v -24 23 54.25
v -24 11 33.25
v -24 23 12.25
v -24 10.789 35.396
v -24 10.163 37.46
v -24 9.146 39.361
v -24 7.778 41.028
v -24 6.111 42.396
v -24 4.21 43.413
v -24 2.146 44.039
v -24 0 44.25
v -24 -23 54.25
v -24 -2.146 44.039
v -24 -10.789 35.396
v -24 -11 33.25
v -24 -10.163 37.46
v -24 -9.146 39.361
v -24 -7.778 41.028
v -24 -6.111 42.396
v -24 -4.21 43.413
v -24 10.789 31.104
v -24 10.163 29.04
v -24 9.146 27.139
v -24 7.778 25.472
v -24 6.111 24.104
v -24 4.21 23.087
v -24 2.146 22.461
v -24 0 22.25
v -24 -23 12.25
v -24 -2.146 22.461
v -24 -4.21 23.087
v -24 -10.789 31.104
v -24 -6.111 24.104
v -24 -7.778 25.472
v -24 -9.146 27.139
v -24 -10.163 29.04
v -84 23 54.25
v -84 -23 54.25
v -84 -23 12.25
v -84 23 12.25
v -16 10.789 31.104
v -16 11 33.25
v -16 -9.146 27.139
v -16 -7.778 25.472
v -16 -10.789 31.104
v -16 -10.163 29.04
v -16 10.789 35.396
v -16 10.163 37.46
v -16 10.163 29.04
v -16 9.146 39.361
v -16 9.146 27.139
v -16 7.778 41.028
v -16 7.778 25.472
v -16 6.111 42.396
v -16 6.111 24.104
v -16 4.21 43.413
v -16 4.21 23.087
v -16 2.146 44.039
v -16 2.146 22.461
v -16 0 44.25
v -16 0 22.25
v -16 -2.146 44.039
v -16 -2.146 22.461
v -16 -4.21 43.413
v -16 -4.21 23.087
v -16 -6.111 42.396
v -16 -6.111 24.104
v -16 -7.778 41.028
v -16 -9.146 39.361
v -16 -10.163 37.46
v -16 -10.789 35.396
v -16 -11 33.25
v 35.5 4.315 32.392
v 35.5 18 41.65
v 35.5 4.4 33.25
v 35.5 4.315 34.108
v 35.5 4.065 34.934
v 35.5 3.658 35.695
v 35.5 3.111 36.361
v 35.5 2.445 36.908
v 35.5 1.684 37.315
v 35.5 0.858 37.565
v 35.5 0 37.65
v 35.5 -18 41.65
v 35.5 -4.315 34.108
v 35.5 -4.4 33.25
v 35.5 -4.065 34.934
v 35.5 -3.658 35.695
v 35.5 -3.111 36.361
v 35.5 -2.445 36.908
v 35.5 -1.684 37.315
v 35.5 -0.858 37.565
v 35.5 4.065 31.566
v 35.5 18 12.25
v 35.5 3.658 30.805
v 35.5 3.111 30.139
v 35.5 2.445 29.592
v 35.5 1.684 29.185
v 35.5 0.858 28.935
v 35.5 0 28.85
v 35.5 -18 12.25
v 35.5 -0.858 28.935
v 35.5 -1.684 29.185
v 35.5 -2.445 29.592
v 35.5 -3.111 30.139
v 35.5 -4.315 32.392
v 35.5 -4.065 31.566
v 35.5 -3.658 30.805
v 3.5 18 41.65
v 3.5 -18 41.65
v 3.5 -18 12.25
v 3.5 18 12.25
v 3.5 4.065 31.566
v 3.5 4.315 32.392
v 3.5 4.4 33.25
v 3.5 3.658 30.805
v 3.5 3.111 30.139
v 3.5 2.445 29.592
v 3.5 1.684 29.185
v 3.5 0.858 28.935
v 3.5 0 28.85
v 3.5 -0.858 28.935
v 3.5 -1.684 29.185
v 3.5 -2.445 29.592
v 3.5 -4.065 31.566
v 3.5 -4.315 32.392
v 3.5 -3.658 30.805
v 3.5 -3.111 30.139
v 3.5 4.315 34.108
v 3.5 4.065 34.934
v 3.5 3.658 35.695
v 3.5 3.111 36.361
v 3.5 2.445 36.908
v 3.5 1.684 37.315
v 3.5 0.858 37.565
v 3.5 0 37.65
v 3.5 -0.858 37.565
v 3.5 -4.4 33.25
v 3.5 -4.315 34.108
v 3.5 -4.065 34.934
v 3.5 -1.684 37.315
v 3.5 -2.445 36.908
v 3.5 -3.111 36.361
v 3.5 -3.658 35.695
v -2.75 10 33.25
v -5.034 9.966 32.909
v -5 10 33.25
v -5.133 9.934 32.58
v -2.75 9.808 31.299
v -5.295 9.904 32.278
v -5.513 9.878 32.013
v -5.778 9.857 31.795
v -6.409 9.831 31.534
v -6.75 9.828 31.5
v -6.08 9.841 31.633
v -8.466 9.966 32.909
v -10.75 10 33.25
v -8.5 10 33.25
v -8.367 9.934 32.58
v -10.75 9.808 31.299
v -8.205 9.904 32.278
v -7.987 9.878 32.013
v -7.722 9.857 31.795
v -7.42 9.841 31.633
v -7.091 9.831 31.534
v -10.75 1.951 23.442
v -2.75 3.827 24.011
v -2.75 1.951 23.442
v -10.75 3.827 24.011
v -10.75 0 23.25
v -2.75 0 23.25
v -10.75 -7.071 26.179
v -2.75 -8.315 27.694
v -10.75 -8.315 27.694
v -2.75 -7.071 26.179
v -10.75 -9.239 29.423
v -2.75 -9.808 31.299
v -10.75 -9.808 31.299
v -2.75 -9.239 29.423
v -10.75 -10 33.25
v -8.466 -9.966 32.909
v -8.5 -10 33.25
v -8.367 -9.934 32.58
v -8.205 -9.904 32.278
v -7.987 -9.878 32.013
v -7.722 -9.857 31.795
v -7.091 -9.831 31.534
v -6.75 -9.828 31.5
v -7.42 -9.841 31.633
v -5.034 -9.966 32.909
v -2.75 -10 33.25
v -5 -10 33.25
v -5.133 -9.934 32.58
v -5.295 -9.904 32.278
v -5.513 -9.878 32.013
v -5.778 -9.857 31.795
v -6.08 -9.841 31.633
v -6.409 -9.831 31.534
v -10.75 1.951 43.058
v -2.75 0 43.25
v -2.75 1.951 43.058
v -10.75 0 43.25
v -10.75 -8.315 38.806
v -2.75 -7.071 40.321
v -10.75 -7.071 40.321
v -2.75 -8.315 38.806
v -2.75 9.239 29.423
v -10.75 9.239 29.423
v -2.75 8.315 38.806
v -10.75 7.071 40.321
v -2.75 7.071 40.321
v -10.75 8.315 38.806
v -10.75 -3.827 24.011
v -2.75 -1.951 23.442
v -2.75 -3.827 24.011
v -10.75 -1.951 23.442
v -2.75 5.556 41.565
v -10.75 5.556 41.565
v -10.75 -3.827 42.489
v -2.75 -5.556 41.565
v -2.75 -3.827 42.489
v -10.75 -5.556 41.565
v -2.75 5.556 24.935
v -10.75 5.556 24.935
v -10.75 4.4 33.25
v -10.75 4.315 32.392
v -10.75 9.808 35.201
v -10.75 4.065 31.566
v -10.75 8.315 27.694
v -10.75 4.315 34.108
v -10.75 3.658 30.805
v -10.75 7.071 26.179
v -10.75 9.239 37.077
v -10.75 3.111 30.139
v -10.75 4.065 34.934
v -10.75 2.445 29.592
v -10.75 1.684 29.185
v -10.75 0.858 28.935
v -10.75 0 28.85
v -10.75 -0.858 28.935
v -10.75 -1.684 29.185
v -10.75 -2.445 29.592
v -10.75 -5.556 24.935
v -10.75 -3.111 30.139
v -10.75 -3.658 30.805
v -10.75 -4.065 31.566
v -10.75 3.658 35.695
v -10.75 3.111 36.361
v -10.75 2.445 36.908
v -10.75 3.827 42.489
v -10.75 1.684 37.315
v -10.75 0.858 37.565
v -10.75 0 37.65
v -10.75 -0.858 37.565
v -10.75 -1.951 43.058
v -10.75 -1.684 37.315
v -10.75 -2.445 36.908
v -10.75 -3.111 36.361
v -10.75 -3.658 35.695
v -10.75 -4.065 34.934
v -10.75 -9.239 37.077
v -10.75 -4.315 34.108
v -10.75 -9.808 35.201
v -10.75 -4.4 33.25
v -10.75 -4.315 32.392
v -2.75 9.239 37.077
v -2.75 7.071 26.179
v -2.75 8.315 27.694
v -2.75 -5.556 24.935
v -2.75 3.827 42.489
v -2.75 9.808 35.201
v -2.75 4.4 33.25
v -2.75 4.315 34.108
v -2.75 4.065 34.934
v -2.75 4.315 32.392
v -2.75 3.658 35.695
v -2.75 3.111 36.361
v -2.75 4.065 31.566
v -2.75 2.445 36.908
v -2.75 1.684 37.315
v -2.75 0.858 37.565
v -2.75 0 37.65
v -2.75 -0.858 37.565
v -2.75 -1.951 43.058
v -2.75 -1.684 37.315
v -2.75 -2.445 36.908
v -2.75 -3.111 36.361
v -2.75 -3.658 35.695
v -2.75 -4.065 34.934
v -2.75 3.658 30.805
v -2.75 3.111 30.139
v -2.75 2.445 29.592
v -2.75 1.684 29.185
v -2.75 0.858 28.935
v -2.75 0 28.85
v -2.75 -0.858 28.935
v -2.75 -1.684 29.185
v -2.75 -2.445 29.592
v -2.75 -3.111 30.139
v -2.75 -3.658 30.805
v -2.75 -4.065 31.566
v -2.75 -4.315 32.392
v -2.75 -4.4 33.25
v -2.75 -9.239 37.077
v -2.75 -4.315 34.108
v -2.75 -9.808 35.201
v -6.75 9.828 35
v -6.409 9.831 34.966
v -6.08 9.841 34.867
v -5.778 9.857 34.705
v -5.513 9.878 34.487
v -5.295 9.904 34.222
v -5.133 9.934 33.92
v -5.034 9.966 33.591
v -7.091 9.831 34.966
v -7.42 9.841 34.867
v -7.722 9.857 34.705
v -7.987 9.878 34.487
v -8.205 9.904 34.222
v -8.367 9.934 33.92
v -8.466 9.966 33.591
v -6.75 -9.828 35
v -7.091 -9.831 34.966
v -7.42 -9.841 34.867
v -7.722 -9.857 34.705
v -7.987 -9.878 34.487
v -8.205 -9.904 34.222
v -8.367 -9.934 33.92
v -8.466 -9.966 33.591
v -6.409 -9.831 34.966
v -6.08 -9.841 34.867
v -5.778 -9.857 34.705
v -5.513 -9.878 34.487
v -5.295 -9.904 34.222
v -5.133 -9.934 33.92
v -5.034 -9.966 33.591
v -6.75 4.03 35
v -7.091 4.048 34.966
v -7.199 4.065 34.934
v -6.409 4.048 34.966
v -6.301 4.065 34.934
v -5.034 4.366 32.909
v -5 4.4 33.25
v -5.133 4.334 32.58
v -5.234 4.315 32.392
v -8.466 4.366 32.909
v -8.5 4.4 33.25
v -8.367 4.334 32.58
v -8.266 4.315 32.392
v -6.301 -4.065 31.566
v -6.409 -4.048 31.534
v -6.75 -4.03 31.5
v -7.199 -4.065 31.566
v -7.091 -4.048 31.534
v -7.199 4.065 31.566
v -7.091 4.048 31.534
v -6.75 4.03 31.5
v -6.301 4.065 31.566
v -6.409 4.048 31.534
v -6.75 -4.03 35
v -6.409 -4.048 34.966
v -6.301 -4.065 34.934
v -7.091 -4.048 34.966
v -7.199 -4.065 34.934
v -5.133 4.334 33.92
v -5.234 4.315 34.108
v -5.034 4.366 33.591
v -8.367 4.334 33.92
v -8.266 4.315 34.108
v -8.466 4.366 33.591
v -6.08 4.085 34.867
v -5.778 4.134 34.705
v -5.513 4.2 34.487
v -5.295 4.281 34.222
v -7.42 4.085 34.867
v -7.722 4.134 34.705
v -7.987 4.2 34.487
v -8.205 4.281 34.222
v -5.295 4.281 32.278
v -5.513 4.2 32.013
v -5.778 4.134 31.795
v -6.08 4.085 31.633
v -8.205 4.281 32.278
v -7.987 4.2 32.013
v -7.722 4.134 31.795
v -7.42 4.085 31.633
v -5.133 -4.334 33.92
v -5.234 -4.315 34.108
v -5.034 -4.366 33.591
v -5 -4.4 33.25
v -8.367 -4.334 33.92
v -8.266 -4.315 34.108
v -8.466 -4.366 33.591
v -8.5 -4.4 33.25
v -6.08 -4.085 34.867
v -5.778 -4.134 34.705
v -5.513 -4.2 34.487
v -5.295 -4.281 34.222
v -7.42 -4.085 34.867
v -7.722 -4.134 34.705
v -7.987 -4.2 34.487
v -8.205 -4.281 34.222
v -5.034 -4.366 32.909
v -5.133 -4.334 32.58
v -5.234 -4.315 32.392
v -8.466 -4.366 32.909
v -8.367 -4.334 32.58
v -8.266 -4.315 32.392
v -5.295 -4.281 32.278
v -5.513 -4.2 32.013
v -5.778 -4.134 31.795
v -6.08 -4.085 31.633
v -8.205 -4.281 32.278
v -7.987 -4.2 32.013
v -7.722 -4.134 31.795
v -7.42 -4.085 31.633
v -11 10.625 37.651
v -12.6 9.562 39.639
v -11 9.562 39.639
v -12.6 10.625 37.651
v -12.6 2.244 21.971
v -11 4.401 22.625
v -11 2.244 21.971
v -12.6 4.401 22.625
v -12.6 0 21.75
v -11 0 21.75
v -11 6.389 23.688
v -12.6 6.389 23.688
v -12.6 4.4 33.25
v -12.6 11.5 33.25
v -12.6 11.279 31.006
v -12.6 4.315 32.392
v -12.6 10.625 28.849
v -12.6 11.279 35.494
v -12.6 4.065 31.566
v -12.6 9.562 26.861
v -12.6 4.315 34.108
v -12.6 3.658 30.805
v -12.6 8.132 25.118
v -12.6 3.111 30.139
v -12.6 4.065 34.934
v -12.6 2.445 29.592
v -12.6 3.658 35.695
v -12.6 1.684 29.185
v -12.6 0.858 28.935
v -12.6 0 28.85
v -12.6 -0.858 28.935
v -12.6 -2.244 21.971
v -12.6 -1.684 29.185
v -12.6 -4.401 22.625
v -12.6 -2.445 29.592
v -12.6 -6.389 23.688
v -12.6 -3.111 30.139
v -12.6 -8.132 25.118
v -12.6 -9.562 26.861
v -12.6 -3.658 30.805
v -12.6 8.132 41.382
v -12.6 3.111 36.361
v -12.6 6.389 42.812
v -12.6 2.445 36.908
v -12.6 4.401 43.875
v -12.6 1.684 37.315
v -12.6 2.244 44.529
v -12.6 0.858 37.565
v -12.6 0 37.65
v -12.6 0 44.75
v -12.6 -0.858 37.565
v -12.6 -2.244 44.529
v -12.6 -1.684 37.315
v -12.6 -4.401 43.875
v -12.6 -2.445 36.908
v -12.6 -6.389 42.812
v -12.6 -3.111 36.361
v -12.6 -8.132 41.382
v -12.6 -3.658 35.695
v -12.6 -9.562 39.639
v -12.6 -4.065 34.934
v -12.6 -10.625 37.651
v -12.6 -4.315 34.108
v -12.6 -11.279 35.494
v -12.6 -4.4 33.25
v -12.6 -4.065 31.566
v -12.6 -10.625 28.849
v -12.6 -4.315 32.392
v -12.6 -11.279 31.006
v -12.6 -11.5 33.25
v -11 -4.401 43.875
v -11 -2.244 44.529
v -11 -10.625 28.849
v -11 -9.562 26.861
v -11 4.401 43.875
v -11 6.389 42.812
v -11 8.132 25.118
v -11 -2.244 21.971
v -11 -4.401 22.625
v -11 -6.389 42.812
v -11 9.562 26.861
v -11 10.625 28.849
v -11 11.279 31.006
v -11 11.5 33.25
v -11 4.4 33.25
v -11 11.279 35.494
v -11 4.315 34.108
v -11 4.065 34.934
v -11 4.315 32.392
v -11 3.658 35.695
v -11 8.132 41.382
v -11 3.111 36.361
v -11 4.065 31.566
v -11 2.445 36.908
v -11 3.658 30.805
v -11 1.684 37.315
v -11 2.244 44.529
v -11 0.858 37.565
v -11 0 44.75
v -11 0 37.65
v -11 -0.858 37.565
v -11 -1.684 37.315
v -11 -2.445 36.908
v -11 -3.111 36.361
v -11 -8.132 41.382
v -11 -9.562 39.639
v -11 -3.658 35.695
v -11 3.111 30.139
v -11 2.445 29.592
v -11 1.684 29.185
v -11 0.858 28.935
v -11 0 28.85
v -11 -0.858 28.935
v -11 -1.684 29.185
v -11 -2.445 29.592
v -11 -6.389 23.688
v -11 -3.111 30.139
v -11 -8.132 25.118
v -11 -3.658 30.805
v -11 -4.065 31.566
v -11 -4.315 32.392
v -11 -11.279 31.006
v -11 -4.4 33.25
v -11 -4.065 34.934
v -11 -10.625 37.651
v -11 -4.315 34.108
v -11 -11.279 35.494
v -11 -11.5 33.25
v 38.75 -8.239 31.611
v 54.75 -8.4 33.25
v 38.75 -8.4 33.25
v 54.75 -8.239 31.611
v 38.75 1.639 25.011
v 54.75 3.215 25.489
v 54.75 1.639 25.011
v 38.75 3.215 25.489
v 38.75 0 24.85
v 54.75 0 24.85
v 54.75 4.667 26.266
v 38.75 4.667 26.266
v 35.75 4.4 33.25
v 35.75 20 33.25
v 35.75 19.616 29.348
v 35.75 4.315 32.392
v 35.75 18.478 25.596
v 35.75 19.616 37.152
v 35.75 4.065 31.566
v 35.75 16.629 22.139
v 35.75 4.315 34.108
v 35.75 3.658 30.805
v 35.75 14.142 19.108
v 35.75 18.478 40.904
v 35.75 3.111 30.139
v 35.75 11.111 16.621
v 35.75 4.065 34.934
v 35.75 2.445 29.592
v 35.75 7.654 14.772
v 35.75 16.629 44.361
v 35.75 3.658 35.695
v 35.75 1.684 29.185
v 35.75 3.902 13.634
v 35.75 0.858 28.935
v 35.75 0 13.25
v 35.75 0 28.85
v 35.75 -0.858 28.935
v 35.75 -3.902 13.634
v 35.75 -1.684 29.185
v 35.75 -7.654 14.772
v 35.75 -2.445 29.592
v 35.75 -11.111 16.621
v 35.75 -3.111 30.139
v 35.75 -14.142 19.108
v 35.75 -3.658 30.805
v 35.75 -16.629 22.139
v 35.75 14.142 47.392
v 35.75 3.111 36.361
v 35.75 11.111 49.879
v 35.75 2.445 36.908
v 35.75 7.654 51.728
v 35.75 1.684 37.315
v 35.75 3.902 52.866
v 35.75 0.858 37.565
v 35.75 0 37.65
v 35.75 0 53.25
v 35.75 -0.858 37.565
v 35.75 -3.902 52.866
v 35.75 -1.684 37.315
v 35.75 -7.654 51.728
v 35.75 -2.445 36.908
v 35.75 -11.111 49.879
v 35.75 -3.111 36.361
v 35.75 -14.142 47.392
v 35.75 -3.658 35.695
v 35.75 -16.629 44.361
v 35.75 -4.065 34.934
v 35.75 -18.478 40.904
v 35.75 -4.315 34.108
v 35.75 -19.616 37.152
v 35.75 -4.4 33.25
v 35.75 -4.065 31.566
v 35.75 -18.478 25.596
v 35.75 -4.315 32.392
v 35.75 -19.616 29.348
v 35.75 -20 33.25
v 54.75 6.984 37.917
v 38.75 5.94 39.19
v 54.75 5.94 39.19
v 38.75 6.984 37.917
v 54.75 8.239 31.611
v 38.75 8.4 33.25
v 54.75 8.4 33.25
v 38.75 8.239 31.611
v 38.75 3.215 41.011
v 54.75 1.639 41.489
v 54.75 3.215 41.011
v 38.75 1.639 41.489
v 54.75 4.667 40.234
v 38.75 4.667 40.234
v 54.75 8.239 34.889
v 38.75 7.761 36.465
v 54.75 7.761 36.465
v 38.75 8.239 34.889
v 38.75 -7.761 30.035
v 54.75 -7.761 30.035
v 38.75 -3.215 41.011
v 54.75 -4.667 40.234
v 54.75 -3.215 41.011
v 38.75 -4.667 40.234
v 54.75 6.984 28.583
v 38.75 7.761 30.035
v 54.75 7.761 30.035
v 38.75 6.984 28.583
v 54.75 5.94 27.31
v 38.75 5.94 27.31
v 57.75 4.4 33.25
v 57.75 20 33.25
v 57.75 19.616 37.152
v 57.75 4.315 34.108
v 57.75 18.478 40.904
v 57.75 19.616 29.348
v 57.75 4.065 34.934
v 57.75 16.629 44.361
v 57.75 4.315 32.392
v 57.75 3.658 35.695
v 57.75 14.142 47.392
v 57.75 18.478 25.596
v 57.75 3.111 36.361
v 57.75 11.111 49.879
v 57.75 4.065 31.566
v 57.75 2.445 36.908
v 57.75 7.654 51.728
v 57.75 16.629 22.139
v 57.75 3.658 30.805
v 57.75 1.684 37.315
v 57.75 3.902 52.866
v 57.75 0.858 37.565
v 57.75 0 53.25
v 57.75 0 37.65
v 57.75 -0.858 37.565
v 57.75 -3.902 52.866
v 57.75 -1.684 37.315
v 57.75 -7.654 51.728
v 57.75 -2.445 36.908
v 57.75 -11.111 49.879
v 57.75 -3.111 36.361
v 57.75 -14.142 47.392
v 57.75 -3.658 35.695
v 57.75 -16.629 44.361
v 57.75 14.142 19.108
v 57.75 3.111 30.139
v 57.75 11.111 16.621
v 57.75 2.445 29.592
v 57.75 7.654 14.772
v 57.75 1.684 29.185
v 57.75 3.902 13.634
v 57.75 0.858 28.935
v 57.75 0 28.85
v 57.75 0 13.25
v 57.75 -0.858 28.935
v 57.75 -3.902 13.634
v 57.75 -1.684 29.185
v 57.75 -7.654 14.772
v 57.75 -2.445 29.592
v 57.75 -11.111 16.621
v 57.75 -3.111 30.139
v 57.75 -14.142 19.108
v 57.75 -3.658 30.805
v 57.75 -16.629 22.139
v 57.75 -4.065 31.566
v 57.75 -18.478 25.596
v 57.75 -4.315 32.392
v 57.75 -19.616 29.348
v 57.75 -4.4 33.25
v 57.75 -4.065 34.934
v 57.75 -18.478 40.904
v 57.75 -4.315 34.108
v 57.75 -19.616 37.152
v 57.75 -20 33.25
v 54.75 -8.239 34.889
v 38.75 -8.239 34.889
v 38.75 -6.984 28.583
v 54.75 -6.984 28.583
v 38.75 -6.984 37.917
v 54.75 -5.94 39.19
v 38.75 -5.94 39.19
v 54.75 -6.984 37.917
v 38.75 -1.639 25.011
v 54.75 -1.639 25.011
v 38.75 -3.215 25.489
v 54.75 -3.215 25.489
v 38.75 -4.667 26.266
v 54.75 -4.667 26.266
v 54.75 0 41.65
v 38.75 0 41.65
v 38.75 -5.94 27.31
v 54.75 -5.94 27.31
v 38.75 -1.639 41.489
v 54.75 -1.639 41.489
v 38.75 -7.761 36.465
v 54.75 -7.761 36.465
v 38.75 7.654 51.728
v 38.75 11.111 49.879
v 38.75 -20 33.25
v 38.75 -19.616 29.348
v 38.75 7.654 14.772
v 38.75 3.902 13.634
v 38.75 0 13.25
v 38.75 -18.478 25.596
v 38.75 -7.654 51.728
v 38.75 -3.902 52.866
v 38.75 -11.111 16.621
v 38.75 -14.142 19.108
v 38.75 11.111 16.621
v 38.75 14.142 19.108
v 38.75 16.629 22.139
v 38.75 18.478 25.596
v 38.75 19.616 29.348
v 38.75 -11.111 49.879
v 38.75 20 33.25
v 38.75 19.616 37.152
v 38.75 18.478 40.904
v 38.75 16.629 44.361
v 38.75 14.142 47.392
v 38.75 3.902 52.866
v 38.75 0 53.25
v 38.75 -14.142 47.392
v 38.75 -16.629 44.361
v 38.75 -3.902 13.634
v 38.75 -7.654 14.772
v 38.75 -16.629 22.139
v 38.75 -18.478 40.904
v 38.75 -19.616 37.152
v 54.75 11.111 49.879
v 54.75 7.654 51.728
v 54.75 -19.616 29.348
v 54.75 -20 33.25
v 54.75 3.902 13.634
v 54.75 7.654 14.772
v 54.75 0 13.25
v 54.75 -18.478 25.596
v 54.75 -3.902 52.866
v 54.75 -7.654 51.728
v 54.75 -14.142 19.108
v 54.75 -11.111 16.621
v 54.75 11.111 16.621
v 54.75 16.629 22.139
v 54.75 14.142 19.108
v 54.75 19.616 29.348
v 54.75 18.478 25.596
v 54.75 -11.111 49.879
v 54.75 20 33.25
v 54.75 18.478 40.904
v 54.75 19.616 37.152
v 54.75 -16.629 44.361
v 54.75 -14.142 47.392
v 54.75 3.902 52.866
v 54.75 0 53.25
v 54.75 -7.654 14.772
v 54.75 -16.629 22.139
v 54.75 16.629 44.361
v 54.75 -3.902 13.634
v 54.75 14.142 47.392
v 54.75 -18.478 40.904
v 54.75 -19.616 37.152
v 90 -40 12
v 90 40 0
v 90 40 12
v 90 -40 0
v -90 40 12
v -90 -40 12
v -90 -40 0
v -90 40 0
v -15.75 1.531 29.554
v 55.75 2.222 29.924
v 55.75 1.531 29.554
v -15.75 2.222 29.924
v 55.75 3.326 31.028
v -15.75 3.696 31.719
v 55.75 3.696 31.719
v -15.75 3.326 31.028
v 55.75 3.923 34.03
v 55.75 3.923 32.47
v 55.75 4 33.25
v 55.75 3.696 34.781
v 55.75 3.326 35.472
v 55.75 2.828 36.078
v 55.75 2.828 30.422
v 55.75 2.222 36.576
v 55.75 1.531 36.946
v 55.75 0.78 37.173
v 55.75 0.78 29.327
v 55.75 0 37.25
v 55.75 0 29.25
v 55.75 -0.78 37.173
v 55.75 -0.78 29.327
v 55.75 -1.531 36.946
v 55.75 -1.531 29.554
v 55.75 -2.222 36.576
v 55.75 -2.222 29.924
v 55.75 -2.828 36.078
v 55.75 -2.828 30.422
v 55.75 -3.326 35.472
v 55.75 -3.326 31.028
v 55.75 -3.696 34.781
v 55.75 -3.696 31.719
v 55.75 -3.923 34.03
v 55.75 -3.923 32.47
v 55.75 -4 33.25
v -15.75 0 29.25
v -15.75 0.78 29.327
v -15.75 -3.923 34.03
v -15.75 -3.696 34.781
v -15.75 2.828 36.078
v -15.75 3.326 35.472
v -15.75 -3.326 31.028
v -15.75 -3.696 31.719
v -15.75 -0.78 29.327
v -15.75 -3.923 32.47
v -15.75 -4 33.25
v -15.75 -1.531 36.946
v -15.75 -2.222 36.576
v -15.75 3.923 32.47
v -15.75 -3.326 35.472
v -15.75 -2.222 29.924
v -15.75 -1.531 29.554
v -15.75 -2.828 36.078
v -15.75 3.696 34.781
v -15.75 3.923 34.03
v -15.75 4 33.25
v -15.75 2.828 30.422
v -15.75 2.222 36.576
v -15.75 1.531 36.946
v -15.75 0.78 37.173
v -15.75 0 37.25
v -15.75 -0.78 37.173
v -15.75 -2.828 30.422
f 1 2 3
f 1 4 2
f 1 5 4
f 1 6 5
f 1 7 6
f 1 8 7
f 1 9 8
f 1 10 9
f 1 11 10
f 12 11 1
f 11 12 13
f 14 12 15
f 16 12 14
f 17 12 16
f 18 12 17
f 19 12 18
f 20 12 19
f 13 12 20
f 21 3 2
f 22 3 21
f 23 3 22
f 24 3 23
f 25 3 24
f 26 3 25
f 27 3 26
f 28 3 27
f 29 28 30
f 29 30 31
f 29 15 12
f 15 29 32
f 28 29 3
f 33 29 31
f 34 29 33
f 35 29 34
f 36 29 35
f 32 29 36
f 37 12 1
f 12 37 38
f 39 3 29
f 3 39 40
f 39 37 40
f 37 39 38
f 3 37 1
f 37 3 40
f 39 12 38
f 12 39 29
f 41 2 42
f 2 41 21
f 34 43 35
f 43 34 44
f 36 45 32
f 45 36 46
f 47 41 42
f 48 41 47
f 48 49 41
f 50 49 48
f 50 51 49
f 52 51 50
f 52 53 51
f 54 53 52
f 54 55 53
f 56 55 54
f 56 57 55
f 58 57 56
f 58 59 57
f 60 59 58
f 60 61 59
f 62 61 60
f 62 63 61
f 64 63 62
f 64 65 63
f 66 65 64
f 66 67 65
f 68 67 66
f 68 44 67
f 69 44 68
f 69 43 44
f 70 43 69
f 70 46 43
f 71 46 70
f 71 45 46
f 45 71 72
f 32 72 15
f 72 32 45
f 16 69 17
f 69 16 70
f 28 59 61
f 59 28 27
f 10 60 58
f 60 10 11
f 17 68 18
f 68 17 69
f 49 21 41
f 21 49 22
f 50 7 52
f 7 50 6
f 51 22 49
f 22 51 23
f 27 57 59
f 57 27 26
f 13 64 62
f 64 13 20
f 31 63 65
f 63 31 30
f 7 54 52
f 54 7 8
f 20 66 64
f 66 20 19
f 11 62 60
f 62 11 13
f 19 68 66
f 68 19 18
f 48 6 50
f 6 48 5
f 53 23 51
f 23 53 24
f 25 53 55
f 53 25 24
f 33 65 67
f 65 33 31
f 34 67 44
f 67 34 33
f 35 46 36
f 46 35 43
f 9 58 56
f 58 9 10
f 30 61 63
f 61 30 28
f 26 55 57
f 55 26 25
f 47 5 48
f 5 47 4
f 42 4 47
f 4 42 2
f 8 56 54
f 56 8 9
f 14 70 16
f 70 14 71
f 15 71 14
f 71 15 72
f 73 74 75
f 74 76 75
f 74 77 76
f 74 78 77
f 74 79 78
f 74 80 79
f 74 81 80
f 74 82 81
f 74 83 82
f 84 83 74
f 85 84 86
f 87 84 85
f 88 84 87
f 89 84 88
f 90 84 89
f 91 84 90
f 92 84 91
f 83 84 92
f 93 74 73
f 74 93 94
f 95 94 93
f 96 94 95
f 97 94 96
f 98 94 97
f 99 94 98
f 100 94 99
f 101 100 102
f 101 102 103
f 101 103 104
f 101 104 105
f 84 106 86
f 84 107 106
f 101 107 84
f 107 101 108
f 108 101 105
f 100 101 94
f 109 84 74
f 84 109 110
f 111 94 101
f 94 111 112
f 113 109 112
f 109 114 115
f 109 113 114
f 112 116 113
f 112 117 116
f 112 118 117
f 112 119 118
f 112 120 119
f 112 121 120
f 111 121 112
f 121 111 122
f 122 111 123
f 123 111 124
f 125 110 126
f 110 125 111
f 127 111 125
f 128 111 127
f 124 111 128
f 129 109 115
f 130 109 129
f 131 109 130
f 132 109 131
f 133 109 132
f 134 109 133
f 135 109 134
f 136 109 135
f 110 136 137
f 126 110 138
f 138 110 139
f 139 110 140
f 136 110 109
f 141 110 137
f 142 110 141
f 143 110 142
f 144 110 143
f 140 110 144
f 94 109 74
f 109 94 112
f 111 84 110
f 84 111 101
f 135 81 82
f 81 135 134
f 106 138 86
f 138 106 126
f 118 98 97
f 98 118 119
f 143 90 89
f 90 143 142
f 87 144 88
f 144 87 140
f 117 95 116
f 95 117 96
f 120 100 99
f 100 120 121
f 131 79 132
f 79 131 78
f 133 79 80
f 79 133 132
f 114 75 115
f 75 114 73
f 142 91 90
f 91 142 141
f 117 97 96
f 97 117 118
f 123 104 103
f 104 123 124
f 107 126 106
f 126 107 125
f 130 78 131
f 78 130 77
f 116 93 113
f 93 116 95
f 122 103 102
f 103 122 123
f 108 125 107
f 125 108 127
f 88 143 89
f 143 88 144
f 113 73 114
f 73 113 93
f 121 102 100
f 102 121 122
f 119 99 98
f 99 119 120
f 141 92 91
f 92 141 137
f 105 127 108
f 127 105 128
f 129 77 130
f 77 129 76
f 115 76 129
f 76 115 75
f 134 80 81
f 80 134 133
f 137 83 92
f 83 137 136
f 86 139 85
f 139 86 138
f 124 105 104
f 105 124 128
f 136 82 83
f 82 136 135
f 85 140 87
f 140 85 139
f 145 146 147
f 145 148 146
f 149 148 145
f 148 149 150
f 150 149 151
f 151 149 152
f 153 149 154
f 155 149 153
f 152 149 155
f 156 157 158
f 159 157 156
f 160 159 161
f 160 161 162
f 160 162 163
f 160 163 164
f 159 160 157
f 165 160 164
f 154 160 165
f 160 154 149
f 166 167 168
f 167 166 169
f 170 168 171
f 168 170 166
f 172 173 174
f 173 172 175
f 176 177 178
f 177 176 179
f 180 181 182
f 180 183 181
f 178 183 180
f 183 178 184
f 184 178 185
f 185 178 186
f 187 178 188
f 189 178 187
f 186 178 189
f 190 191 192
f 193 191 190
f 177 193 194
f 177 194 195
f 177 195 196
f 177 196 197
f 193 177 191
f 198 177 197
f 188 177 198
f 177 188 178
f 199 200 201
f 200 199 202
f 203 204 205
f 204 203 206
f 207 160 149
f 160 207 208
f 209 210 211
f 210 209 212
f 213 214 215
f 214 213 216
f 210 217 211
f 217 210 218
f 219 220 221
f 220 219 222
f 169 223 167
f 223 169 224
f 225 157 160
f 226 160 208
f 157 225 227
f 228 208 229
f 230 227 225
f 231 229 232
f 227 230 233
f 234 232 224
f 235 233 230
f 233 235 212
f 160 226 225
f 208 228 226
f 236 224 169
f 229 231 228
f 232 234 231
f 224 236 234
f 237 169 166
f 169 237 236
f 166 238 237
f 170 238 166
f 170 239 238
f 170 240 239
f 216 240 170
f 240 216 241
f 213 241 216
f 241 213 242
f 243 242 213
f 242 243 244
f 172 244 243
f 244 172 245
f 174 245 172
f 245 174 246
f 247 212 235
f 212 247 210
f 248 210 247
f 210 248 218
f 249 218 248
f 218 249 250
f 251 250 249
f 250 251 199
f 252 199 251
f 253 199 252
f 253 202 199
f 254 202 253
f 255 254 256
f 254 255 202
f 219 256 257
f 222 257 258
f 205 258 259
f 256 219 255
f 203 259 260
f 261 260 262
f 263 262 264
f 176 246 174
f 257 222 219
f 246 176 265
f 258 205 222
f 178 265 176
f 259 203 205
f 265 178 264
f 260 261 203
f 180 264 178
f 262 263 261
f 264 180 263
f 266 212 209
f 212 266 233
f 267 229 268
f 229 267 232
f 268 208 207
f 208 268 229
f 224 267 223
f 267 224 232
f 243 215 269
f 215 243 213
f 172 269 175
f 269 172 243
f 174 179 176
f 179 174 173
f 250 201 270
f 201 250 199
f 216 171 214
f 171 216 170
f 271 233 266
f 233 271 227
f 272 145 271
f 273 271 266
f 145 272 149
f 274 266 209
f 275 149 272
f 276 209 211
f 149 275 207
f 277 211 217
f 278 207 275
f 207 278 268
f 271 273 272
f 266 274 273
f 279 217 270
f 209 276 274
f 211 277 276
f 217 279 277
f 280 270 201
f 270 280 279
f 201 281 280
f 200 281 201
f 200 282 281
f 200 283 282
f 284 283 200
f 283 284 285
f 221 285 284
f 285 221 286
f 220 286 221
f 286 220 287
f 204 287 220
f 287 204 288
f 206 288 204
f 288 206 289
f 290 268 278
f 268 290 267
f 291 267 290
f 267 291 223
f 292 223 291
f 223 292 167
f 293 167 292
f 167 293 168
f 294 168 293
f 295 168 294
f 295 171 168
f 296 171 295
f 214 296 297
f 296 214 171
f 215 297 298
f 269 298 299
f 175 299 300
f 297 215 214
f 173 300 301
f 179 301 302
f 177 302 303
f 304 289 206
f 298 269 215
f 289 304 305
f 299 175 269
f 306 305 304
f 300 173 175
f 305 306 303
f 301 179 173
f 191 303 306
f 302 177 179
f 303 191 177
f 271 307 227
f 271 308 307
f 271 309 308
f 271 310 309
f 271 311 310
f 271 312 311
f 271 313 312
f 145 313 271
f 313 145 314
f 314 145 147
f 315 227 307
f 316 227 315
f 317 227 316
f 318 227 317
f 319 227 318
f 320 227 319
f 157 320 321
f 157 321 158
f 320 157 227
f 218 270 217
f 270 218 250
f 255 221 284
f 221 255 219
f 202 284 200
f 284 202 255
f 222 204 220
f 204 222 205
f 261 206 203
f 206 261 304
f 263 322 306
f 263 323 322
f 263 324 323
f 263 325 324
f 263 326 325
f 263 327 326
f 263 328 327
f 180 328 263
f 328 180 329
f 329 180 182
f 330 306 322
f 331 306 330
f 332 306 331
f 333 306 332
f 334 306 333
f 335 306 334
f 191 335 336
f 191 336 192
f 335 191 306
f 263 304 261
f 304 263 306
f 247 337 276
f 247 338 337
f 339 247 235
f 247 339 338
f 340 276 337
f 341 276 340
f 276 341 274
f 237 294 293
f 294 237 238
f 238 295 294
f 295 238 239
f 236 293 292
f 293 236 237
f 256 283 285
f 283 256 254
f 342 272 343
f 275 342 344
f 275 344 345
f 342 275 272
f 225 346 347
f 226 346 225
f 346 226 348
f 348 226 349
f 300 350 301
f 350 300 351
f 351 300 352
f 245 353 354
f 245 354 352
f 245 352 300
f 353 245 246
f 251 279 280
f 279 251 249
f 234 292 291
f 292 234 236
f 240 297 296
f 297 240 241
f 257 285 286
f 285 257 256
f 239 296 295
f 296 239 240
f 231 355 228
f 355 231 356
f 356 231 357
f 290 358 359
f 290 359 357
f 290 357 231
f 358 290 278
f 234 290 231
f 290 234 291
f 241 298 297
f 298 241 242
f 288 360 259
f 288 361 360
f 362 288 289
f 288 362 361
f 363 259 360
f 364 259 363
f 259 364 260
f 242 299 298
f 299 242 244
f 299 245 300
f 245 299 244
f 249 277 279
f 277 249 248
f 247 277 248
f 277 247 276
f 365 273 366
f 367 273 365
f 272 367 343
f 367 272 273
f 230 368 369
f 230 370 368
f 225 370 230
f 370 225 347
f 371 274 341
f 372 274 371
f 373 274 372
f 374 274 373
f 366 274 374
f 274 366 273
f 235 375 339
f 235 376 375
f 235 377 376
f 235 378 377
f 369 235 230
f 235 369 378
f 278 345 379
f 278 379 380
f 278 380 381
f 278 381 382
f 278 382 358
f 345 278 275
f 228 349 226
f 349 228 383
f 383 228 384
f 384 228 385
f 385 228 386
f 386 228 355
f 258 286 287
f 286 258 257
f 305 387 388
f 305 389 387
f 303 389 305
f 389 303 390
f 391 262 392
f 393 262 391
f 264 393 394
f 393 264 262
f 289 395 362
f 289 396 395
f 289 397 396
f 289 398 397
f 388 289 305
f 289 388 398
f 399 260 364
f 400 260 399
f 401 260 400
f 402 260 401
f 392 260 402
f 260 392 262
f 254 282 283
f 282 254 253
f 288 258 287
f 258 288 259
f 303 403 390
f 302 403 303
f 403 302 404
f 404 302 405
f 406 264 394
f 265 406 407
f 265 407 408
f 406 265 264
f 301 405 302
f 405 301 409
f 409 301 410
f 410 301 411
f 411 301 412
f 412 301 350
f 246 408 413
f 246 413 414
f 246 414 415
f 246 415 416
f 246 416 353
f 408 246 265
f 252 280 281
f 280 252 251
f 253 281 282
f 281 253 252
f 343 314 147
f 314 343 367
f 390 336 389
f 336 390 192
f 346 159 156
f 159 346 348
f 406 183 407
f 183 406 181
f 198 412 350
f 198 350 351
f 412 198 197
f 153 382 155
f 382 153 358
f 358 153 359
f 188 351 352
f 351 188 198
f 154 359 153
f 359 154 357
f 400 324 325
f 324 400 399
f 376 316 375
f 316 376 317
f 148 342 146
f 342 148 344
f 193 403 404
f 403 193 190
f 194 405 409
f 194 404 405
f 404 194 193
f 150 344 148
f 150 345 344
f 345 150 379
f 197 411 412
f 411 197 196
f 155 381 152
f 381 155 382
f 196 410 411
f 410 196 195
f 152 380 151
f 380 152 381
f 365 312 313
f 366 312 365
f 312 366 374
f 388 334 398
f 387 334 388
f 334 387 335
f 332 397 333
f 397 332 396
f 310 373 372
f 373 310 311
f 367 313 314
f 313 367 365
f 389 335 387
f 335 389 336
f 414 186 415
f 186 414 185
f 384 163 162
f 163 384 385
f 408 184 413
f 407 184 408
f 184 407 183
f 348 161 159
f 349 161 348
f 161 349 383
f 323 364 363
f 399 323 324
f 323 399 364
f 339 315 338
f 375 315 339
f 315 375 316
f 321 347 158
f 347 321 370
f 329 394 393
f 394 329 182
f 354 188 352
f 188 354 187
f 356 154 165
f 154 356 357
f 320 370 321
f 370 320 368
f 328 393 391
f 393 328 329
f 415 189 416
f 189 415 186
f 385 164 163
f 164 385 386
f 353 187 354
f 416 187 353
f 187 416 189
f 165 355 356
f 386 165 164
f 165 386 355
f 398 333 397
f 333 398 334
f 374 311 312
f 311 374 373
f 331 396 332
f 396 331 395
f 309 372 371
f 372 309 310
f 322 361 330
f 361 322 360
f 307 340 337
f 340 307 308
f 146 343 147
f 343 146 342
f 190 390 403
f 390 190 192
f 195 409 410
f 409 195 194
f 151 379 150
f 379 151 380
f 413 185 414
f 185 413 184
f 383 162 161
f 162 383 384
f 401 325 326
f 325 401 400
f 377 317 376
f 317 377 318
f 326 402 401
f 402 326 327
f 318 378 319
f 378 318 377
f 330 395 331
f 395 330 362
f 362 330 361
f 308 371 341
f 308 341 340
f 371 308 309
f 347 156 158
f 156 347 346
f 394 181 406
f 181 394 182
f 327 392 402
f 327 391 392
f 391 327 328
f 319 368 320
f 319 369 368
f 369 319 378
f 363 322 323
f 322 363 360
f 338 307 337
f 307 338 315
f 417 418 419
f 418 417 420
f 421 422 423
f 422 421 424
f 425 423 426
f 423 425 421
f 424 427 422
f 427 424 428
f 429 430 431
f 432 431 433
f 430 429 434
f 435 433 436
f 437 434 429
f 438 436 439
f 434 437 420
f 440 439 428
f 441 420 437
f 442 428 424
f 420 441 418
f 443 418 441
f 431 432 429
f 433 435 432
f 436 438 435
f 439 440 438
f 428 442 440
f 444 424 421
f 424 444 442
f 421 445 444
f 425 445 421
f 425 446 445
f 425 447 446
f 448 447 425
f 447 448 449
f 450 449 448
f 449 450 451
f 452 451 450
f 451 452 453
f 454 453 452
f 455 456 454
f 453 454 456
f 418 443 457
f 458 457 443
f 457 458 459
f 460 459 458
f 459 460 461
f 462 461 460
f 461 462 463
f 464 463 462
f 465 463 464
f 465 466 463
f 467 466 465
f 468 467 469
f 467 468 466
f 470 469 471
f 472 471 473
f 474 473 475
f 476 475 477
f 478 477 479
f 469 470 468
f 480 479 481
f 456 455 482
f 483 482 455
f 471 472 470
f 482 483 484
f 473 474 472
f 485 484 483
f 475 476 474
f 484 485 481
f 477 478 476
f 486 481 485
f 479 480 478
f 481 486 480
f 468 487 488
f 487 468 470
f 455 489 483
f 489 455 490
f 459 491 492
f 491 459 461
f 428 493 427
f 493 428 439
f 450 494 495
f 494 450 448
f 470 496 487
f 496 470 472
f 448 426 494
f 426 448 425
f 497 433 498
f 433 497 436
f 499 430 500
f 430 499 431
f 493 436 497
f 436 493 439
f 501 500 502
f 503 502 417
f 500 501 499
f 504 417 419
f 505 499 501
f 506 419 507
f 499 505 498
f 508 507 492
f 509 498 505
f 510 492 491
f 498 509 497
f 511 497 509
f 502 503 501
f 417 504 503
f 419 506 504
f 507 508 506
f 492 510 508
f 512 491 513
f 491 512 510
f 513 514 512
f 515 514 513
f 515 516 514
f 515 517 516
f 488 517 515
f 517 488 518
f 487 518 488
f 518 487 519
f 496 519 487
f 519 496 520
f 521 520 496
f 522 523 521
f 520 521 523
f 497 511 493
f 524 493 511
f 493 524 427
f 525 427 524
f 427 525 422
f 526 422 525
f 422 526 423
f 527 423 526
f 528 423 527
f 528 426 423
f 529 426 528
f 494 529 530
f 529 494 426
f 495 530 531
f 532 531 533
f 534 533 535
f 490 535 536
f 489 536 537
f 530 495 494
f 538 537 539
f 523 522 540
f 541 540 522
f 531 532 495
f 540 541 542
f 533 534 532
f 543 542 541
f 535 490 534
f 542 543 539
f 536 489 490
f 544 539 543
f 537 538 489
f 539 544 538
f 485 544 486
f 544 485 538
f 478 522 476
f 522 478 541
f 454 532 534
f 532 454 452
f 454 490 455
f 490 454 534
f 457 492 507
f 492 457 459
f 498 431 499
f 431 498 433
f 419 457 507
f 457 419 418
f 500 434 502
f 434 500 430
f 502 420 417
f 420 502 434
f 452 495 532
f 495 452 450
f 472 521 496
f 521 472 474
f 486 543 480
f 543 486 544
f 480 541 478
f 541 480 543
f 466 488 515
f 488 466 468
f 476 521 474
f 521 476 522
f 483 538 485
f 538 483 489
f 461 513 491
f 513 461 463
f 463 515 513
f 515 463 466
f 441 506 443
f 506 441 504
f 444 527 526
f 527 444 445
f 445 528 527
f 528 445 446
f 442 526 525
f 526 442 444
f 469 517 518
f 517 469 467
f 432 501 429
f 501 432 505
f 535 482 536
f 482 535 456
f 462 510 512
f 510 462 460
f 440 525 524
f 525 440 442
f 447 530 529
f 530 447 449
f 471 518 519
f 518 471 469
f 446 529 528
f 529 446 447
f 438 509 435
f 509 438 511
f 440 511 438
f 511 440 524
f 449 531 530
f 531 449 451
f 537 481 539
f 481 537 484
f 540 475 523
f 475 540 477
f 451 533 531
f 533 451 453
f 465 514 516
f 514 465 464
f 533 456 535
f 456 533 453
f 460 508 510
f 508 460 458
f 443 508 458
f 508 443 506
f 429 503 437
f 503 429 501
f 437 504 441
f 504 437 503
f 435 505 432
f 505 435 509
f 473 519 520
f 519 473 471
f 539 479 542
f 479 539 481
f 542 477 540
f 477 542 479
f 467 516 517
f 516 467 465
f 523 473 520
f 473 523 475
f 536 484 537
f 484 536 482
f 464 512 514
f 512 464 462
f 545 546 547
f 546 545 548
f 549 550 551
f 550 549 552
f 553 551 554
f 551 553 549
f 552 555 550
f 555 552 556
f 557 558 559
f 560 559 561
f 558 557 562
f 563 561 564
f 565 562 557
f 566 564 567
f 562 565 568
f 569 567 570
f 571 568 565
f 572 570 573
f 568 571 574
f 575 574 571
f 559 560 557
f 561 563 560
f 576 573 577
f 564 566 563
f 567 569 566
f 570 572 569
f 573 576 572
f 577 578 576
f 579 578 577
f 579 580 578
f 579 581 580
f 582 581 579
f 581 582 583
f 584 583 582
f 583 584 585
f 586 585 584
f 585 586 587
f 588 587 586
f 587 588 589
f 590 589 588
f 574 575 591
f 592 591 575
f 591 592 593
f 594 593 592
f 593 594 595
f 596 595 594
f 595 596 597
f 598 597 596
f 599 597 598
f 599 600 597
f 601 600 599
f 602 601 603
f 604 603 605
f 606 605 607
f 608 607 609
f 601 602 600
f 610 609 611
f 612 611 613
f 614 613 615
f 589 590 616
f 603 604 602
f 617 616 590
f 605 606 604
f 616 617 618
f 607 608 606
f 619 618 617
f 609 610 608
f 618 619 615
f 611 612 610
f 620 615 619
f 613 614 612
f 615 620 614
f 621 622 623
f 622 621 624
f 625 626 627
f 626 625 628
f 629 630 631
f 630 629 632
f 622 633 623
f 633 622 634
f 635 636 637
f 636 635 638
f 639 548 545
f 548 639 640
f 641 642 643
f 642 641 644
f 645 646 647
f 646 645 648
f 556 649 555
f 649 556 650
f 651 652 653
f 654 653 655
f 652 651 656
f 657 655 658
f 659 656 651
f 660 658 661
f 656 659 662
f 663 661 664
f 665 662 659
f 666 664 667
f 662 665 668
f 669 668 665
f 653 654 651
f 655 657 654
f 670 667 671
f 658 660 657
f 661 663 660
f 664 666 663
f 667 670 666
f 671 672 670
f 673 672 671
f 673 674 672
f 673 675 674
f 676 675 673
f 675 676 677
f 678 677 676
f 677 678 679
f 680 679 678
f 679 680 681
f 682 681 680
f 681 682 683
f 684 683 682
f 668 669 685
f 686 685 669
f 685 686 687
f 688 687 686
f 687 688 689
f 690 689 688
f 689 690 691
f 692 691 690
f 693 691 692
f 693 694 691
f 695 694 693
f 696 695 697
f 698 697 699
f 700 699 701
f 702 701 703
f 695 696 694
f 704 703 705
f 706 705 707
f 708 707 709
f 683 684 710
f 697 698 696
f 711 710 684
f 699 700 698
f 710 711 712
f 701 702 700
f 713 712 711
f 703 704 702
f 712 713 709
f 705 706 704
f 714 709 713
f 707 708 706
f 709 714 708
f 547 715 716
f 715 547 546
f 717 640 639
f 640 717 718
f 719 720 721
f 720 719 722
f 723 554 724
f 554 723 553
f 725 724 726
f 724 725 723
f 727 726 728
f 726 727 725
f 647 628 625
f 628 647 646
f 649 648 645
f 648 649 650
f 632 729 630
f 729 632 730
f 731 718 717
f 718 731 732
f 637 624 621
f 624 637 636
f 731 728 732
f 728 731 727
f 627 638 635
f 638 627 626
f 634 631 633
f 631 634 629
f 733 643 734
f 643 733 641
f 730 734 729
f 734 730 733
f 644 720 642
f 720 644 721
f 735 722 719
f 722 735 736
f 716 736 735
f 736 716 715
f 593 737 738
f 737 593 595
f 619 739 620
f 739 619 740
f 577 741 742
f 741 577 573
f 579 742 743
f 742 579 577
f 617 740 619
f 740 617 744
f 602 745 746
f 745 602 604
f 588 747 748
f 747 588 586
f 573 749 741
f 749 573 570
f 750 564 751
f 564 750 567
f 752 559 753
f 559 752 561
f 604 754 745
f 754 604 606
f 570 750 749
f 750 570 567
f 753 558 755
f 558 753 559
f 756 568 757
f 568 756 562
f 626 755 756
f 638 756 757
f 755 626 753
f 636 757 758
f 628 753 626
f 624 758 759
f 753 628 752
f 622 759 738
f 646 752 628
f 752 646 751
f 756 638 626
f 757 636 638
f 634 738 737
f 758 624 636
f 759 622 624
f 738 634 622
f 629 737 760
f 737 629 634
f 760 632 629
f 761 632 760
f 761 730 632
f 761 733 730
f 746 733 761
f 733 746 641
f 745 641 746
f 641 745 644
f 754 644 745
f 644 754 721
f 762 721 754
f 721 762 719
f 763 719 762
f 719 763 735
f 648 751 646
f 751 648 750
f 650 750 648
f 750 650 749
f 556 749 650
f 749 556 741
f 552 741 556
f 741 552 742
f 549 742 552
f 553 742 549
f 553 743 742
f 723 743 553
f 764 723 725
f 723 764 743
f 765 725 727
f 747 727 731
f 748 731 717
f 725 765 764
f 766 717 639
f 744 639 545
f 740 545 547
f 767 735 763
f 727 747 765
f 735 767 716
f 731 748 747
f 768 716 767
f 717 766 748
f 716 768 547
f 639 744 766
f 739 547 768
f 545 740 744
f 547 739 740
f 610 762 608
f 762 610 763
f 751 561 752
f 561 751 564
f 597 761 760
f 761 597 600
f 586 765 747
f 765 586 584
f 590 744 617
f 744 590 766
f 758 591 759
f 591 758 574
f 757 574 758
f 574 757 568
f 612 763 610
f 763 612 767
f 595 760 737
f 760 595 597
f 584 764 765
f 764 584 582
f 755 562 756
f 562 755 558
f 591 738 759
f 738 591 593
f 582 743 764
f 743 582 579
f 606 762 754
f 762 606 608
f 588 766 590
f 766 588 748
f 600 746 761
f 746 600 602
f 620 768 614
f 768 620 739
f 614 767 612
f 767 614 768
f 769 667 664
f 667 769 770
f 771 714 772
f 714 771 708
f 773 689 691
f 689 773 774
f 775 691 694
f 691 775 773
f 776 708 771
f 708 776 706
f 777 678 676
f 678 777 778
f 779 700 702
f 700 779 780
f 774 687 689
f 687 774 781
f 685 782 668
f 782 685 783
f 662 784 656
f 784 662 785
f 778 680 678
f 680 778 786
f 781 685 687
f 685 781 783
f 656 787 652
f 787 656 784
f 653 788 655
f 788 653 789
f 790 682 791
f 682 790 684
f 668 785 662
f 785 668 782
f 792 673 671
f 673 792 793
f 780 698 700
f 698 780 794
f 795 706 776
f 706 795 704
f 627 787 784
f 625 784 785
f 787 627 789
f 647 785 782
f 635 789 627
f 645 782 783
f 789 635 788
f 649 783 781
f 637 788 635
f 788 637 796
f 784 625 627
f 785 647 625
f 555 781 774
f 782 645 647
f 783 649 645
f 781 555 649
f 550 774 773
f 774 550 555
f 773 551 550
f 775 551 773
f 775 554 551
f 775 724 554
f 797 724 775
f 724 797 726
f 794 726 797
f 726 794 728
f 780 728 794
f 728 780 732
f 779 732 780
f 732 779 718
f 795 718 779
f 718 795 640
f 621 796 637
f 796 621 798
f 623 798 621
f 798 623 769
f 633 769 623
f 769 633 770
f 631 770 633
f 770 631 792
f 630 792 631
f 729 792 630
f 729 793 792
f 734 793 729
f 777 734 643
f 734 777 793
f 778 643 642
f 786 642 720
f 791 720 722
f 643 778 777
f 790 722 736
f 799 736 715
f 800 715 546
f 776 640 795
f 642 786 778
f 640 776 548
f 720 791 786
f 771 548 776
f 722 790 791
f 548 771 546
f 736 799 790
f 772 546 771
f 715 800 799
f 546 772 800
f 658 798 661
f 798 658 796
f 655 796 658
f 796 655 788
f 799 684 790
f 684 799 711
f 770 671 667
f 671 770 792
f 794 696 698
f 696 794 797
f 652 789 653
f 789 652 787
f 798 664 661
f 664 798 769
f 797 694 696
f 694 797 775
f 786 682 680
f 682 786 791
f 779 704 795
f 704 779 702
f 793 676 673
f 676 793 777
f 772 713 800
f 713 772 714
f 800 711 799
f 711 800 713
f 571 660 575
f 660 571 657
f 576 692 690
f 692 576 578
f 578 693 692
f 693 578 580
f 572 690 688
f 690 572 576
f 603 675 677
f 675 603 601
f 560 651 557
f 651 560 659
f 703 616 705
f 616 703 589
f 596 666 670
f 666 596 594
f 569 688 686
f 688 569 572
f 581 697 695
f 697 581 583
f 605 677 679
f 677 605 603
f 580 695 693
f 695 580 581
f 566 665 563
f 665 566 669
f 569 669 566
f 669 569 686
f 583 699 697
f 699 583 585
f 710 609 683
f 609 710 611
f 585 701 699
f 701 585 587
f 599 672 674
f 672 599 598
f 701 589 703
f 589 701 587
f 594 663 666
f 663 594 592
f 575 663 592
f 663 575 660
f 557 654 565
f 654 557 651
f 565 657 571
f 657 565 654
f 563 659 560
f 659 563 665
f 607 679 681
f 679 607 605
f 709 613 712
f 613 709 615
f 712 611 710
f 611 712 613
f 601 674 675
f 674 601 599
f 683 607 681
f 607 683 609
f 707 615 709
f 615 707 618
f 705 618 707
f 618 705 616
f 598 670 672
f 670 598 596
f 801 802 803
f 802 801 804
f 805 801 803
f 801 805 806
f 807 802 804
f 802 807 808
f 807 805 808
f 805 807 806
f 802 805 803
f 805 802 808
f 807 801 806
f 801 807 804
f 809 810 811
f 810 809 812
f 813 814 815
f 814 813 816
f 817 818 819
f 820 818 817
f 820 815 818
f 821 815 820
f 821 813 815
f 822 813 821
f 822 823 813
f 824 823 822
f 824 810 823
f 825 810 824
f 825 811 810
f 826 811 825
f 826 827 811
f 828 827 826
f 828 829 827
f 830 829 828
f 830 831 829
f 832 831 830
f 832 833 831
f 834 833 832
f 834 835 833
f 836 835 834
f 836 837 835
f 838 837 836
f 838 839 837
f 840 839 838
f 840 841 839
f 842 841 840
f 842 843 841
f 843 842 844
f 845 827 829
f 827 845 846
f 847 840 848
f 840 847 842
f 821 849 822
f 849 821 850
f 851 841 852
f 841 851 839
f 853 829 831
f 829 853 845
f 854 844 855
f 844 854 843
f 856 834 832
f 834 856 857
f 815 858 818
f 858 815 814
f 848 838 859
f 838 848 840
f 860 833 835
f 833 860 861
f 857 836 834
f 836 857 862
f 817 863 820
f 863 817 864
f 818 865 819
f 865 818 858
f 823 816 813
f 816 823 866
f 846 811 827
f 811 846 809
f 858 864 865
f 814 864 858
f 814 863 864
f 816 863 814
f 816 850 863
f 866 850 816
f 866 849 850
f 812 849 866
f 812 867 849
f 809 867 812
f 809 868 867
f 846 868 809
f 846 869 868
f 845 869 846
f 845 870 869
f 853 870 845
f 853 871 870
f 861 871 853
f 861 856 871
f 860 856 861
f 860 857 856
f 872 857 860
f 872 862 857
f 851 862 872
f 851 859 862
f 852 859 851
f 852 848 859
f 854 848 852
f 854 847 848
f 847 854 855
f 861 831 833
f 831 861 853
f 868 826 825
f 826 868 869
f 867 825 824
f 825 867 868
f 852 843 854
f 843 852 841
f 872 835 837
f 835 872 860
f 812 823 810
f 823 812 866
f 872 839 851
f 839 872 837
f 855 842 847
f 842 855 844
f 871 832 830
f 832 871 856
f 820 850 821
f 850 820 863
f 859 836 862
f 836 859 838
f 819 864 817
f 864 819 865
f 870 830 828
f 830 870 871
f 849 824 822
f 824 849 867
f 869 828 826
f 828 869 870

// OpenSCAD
$fn = 32;

// ------------------------------------------------------------------------
// Motor drive station: motor 60 x 42 mm, shaft d8, pulley d40
// Every part is its own module, assembly() places every instance.
// ------------------------------------------------------------------------

// --- part 1 ---
module station_bed() {
  difference() {
    translate([-90, -40, 0]) cube([180, 80, 12]);
  }
}

// --- part 2 ---
module drive_motor() {
  union() {
    translate([-30, -23, 0]) cube([60, 46, 42]);
    translate([34, 0, 21]) rotate([0, 90, 0]) cylinder(h = 8, d = 22, center = true);
  }
}

// --- part 3 ---
module pillow_block() {
  difference() {
    translate([-16, -18, 0]) cube([32, 36, 29.4]);
    translate([0, 0, 21]) rotate([0, 90, 0]) cylinder(h = 34, d = 8.8, center = true);
  }
}

// --- part 4 ---
module drive_shaft() {
  translate([0, 0, -35.75]) cylinder(h = 71.5, d = 8);
}

// --- part 5 ---
module shaft_collar() {
  difference() {
    cylinder(h = 8, d = 20);
    translate([0, 0, -1]) cylinder(h = 10, d = 8.8);
    translate([0, 0, 4]) rotate([90, 0, 0]) cylinder(h = 22, d = 3.5, center = true);
  }
}

// --- part 6 ---
module collar_washer() {
  difference() {
      translate([0, 0, 0]) cylinder(h = 1.6, d = 23);
      translate([0, 0, -1]) cylinder(h = 3.6, d = 8.8);
    }
}

// --- part 7 ---
module drive_pulley() {
  difference() {
    union() {
      cylinder(h = 22, d = 16.8);
      cylinder(h = 3, d = 40);
      translate([0, 0, 19]) cylinder(h = 3, d = 40);
    }
    translate([0, 0, -1]) cylinder(h = 24, d = 8.8);
  }
}

// --- assembly ---
module assembly() {
  color([0.80, 0.24, 0.20]) translate([0, 0, 0]) rotate([0, 0, 0]) station_bed();
  color([0.20, 0.45, 0.75]) translate([-54, 0, 12.25]) rotate([0, 0, 0]) drive_motor();
  color([0.25, 0.62, 0.32]) translate([19.5, 0, 12.25]) rotate([0, 0, 0]) pillow_block();
  color([0.92, 0.70, 0.18]) translate([20, 0, 33.25]) rotate([0, 90, 0]) drive_shaft();
  color([0.58, 0.35, 0.70]) translate([-10.75, 0, 33.25]) rotate([0, 90, 0]) shaft_collar();
  color([0.16, 0.66, 0.66]) translate([-12.6, 0, 33.25]) rotate([0, 90, 0]) collar_washer();
  color([0.85, 0.48, 0.18]) translate([35.75, 0, 33.25]) rotate([0, 90, 0]) drive_pulley();
}

assembly();
